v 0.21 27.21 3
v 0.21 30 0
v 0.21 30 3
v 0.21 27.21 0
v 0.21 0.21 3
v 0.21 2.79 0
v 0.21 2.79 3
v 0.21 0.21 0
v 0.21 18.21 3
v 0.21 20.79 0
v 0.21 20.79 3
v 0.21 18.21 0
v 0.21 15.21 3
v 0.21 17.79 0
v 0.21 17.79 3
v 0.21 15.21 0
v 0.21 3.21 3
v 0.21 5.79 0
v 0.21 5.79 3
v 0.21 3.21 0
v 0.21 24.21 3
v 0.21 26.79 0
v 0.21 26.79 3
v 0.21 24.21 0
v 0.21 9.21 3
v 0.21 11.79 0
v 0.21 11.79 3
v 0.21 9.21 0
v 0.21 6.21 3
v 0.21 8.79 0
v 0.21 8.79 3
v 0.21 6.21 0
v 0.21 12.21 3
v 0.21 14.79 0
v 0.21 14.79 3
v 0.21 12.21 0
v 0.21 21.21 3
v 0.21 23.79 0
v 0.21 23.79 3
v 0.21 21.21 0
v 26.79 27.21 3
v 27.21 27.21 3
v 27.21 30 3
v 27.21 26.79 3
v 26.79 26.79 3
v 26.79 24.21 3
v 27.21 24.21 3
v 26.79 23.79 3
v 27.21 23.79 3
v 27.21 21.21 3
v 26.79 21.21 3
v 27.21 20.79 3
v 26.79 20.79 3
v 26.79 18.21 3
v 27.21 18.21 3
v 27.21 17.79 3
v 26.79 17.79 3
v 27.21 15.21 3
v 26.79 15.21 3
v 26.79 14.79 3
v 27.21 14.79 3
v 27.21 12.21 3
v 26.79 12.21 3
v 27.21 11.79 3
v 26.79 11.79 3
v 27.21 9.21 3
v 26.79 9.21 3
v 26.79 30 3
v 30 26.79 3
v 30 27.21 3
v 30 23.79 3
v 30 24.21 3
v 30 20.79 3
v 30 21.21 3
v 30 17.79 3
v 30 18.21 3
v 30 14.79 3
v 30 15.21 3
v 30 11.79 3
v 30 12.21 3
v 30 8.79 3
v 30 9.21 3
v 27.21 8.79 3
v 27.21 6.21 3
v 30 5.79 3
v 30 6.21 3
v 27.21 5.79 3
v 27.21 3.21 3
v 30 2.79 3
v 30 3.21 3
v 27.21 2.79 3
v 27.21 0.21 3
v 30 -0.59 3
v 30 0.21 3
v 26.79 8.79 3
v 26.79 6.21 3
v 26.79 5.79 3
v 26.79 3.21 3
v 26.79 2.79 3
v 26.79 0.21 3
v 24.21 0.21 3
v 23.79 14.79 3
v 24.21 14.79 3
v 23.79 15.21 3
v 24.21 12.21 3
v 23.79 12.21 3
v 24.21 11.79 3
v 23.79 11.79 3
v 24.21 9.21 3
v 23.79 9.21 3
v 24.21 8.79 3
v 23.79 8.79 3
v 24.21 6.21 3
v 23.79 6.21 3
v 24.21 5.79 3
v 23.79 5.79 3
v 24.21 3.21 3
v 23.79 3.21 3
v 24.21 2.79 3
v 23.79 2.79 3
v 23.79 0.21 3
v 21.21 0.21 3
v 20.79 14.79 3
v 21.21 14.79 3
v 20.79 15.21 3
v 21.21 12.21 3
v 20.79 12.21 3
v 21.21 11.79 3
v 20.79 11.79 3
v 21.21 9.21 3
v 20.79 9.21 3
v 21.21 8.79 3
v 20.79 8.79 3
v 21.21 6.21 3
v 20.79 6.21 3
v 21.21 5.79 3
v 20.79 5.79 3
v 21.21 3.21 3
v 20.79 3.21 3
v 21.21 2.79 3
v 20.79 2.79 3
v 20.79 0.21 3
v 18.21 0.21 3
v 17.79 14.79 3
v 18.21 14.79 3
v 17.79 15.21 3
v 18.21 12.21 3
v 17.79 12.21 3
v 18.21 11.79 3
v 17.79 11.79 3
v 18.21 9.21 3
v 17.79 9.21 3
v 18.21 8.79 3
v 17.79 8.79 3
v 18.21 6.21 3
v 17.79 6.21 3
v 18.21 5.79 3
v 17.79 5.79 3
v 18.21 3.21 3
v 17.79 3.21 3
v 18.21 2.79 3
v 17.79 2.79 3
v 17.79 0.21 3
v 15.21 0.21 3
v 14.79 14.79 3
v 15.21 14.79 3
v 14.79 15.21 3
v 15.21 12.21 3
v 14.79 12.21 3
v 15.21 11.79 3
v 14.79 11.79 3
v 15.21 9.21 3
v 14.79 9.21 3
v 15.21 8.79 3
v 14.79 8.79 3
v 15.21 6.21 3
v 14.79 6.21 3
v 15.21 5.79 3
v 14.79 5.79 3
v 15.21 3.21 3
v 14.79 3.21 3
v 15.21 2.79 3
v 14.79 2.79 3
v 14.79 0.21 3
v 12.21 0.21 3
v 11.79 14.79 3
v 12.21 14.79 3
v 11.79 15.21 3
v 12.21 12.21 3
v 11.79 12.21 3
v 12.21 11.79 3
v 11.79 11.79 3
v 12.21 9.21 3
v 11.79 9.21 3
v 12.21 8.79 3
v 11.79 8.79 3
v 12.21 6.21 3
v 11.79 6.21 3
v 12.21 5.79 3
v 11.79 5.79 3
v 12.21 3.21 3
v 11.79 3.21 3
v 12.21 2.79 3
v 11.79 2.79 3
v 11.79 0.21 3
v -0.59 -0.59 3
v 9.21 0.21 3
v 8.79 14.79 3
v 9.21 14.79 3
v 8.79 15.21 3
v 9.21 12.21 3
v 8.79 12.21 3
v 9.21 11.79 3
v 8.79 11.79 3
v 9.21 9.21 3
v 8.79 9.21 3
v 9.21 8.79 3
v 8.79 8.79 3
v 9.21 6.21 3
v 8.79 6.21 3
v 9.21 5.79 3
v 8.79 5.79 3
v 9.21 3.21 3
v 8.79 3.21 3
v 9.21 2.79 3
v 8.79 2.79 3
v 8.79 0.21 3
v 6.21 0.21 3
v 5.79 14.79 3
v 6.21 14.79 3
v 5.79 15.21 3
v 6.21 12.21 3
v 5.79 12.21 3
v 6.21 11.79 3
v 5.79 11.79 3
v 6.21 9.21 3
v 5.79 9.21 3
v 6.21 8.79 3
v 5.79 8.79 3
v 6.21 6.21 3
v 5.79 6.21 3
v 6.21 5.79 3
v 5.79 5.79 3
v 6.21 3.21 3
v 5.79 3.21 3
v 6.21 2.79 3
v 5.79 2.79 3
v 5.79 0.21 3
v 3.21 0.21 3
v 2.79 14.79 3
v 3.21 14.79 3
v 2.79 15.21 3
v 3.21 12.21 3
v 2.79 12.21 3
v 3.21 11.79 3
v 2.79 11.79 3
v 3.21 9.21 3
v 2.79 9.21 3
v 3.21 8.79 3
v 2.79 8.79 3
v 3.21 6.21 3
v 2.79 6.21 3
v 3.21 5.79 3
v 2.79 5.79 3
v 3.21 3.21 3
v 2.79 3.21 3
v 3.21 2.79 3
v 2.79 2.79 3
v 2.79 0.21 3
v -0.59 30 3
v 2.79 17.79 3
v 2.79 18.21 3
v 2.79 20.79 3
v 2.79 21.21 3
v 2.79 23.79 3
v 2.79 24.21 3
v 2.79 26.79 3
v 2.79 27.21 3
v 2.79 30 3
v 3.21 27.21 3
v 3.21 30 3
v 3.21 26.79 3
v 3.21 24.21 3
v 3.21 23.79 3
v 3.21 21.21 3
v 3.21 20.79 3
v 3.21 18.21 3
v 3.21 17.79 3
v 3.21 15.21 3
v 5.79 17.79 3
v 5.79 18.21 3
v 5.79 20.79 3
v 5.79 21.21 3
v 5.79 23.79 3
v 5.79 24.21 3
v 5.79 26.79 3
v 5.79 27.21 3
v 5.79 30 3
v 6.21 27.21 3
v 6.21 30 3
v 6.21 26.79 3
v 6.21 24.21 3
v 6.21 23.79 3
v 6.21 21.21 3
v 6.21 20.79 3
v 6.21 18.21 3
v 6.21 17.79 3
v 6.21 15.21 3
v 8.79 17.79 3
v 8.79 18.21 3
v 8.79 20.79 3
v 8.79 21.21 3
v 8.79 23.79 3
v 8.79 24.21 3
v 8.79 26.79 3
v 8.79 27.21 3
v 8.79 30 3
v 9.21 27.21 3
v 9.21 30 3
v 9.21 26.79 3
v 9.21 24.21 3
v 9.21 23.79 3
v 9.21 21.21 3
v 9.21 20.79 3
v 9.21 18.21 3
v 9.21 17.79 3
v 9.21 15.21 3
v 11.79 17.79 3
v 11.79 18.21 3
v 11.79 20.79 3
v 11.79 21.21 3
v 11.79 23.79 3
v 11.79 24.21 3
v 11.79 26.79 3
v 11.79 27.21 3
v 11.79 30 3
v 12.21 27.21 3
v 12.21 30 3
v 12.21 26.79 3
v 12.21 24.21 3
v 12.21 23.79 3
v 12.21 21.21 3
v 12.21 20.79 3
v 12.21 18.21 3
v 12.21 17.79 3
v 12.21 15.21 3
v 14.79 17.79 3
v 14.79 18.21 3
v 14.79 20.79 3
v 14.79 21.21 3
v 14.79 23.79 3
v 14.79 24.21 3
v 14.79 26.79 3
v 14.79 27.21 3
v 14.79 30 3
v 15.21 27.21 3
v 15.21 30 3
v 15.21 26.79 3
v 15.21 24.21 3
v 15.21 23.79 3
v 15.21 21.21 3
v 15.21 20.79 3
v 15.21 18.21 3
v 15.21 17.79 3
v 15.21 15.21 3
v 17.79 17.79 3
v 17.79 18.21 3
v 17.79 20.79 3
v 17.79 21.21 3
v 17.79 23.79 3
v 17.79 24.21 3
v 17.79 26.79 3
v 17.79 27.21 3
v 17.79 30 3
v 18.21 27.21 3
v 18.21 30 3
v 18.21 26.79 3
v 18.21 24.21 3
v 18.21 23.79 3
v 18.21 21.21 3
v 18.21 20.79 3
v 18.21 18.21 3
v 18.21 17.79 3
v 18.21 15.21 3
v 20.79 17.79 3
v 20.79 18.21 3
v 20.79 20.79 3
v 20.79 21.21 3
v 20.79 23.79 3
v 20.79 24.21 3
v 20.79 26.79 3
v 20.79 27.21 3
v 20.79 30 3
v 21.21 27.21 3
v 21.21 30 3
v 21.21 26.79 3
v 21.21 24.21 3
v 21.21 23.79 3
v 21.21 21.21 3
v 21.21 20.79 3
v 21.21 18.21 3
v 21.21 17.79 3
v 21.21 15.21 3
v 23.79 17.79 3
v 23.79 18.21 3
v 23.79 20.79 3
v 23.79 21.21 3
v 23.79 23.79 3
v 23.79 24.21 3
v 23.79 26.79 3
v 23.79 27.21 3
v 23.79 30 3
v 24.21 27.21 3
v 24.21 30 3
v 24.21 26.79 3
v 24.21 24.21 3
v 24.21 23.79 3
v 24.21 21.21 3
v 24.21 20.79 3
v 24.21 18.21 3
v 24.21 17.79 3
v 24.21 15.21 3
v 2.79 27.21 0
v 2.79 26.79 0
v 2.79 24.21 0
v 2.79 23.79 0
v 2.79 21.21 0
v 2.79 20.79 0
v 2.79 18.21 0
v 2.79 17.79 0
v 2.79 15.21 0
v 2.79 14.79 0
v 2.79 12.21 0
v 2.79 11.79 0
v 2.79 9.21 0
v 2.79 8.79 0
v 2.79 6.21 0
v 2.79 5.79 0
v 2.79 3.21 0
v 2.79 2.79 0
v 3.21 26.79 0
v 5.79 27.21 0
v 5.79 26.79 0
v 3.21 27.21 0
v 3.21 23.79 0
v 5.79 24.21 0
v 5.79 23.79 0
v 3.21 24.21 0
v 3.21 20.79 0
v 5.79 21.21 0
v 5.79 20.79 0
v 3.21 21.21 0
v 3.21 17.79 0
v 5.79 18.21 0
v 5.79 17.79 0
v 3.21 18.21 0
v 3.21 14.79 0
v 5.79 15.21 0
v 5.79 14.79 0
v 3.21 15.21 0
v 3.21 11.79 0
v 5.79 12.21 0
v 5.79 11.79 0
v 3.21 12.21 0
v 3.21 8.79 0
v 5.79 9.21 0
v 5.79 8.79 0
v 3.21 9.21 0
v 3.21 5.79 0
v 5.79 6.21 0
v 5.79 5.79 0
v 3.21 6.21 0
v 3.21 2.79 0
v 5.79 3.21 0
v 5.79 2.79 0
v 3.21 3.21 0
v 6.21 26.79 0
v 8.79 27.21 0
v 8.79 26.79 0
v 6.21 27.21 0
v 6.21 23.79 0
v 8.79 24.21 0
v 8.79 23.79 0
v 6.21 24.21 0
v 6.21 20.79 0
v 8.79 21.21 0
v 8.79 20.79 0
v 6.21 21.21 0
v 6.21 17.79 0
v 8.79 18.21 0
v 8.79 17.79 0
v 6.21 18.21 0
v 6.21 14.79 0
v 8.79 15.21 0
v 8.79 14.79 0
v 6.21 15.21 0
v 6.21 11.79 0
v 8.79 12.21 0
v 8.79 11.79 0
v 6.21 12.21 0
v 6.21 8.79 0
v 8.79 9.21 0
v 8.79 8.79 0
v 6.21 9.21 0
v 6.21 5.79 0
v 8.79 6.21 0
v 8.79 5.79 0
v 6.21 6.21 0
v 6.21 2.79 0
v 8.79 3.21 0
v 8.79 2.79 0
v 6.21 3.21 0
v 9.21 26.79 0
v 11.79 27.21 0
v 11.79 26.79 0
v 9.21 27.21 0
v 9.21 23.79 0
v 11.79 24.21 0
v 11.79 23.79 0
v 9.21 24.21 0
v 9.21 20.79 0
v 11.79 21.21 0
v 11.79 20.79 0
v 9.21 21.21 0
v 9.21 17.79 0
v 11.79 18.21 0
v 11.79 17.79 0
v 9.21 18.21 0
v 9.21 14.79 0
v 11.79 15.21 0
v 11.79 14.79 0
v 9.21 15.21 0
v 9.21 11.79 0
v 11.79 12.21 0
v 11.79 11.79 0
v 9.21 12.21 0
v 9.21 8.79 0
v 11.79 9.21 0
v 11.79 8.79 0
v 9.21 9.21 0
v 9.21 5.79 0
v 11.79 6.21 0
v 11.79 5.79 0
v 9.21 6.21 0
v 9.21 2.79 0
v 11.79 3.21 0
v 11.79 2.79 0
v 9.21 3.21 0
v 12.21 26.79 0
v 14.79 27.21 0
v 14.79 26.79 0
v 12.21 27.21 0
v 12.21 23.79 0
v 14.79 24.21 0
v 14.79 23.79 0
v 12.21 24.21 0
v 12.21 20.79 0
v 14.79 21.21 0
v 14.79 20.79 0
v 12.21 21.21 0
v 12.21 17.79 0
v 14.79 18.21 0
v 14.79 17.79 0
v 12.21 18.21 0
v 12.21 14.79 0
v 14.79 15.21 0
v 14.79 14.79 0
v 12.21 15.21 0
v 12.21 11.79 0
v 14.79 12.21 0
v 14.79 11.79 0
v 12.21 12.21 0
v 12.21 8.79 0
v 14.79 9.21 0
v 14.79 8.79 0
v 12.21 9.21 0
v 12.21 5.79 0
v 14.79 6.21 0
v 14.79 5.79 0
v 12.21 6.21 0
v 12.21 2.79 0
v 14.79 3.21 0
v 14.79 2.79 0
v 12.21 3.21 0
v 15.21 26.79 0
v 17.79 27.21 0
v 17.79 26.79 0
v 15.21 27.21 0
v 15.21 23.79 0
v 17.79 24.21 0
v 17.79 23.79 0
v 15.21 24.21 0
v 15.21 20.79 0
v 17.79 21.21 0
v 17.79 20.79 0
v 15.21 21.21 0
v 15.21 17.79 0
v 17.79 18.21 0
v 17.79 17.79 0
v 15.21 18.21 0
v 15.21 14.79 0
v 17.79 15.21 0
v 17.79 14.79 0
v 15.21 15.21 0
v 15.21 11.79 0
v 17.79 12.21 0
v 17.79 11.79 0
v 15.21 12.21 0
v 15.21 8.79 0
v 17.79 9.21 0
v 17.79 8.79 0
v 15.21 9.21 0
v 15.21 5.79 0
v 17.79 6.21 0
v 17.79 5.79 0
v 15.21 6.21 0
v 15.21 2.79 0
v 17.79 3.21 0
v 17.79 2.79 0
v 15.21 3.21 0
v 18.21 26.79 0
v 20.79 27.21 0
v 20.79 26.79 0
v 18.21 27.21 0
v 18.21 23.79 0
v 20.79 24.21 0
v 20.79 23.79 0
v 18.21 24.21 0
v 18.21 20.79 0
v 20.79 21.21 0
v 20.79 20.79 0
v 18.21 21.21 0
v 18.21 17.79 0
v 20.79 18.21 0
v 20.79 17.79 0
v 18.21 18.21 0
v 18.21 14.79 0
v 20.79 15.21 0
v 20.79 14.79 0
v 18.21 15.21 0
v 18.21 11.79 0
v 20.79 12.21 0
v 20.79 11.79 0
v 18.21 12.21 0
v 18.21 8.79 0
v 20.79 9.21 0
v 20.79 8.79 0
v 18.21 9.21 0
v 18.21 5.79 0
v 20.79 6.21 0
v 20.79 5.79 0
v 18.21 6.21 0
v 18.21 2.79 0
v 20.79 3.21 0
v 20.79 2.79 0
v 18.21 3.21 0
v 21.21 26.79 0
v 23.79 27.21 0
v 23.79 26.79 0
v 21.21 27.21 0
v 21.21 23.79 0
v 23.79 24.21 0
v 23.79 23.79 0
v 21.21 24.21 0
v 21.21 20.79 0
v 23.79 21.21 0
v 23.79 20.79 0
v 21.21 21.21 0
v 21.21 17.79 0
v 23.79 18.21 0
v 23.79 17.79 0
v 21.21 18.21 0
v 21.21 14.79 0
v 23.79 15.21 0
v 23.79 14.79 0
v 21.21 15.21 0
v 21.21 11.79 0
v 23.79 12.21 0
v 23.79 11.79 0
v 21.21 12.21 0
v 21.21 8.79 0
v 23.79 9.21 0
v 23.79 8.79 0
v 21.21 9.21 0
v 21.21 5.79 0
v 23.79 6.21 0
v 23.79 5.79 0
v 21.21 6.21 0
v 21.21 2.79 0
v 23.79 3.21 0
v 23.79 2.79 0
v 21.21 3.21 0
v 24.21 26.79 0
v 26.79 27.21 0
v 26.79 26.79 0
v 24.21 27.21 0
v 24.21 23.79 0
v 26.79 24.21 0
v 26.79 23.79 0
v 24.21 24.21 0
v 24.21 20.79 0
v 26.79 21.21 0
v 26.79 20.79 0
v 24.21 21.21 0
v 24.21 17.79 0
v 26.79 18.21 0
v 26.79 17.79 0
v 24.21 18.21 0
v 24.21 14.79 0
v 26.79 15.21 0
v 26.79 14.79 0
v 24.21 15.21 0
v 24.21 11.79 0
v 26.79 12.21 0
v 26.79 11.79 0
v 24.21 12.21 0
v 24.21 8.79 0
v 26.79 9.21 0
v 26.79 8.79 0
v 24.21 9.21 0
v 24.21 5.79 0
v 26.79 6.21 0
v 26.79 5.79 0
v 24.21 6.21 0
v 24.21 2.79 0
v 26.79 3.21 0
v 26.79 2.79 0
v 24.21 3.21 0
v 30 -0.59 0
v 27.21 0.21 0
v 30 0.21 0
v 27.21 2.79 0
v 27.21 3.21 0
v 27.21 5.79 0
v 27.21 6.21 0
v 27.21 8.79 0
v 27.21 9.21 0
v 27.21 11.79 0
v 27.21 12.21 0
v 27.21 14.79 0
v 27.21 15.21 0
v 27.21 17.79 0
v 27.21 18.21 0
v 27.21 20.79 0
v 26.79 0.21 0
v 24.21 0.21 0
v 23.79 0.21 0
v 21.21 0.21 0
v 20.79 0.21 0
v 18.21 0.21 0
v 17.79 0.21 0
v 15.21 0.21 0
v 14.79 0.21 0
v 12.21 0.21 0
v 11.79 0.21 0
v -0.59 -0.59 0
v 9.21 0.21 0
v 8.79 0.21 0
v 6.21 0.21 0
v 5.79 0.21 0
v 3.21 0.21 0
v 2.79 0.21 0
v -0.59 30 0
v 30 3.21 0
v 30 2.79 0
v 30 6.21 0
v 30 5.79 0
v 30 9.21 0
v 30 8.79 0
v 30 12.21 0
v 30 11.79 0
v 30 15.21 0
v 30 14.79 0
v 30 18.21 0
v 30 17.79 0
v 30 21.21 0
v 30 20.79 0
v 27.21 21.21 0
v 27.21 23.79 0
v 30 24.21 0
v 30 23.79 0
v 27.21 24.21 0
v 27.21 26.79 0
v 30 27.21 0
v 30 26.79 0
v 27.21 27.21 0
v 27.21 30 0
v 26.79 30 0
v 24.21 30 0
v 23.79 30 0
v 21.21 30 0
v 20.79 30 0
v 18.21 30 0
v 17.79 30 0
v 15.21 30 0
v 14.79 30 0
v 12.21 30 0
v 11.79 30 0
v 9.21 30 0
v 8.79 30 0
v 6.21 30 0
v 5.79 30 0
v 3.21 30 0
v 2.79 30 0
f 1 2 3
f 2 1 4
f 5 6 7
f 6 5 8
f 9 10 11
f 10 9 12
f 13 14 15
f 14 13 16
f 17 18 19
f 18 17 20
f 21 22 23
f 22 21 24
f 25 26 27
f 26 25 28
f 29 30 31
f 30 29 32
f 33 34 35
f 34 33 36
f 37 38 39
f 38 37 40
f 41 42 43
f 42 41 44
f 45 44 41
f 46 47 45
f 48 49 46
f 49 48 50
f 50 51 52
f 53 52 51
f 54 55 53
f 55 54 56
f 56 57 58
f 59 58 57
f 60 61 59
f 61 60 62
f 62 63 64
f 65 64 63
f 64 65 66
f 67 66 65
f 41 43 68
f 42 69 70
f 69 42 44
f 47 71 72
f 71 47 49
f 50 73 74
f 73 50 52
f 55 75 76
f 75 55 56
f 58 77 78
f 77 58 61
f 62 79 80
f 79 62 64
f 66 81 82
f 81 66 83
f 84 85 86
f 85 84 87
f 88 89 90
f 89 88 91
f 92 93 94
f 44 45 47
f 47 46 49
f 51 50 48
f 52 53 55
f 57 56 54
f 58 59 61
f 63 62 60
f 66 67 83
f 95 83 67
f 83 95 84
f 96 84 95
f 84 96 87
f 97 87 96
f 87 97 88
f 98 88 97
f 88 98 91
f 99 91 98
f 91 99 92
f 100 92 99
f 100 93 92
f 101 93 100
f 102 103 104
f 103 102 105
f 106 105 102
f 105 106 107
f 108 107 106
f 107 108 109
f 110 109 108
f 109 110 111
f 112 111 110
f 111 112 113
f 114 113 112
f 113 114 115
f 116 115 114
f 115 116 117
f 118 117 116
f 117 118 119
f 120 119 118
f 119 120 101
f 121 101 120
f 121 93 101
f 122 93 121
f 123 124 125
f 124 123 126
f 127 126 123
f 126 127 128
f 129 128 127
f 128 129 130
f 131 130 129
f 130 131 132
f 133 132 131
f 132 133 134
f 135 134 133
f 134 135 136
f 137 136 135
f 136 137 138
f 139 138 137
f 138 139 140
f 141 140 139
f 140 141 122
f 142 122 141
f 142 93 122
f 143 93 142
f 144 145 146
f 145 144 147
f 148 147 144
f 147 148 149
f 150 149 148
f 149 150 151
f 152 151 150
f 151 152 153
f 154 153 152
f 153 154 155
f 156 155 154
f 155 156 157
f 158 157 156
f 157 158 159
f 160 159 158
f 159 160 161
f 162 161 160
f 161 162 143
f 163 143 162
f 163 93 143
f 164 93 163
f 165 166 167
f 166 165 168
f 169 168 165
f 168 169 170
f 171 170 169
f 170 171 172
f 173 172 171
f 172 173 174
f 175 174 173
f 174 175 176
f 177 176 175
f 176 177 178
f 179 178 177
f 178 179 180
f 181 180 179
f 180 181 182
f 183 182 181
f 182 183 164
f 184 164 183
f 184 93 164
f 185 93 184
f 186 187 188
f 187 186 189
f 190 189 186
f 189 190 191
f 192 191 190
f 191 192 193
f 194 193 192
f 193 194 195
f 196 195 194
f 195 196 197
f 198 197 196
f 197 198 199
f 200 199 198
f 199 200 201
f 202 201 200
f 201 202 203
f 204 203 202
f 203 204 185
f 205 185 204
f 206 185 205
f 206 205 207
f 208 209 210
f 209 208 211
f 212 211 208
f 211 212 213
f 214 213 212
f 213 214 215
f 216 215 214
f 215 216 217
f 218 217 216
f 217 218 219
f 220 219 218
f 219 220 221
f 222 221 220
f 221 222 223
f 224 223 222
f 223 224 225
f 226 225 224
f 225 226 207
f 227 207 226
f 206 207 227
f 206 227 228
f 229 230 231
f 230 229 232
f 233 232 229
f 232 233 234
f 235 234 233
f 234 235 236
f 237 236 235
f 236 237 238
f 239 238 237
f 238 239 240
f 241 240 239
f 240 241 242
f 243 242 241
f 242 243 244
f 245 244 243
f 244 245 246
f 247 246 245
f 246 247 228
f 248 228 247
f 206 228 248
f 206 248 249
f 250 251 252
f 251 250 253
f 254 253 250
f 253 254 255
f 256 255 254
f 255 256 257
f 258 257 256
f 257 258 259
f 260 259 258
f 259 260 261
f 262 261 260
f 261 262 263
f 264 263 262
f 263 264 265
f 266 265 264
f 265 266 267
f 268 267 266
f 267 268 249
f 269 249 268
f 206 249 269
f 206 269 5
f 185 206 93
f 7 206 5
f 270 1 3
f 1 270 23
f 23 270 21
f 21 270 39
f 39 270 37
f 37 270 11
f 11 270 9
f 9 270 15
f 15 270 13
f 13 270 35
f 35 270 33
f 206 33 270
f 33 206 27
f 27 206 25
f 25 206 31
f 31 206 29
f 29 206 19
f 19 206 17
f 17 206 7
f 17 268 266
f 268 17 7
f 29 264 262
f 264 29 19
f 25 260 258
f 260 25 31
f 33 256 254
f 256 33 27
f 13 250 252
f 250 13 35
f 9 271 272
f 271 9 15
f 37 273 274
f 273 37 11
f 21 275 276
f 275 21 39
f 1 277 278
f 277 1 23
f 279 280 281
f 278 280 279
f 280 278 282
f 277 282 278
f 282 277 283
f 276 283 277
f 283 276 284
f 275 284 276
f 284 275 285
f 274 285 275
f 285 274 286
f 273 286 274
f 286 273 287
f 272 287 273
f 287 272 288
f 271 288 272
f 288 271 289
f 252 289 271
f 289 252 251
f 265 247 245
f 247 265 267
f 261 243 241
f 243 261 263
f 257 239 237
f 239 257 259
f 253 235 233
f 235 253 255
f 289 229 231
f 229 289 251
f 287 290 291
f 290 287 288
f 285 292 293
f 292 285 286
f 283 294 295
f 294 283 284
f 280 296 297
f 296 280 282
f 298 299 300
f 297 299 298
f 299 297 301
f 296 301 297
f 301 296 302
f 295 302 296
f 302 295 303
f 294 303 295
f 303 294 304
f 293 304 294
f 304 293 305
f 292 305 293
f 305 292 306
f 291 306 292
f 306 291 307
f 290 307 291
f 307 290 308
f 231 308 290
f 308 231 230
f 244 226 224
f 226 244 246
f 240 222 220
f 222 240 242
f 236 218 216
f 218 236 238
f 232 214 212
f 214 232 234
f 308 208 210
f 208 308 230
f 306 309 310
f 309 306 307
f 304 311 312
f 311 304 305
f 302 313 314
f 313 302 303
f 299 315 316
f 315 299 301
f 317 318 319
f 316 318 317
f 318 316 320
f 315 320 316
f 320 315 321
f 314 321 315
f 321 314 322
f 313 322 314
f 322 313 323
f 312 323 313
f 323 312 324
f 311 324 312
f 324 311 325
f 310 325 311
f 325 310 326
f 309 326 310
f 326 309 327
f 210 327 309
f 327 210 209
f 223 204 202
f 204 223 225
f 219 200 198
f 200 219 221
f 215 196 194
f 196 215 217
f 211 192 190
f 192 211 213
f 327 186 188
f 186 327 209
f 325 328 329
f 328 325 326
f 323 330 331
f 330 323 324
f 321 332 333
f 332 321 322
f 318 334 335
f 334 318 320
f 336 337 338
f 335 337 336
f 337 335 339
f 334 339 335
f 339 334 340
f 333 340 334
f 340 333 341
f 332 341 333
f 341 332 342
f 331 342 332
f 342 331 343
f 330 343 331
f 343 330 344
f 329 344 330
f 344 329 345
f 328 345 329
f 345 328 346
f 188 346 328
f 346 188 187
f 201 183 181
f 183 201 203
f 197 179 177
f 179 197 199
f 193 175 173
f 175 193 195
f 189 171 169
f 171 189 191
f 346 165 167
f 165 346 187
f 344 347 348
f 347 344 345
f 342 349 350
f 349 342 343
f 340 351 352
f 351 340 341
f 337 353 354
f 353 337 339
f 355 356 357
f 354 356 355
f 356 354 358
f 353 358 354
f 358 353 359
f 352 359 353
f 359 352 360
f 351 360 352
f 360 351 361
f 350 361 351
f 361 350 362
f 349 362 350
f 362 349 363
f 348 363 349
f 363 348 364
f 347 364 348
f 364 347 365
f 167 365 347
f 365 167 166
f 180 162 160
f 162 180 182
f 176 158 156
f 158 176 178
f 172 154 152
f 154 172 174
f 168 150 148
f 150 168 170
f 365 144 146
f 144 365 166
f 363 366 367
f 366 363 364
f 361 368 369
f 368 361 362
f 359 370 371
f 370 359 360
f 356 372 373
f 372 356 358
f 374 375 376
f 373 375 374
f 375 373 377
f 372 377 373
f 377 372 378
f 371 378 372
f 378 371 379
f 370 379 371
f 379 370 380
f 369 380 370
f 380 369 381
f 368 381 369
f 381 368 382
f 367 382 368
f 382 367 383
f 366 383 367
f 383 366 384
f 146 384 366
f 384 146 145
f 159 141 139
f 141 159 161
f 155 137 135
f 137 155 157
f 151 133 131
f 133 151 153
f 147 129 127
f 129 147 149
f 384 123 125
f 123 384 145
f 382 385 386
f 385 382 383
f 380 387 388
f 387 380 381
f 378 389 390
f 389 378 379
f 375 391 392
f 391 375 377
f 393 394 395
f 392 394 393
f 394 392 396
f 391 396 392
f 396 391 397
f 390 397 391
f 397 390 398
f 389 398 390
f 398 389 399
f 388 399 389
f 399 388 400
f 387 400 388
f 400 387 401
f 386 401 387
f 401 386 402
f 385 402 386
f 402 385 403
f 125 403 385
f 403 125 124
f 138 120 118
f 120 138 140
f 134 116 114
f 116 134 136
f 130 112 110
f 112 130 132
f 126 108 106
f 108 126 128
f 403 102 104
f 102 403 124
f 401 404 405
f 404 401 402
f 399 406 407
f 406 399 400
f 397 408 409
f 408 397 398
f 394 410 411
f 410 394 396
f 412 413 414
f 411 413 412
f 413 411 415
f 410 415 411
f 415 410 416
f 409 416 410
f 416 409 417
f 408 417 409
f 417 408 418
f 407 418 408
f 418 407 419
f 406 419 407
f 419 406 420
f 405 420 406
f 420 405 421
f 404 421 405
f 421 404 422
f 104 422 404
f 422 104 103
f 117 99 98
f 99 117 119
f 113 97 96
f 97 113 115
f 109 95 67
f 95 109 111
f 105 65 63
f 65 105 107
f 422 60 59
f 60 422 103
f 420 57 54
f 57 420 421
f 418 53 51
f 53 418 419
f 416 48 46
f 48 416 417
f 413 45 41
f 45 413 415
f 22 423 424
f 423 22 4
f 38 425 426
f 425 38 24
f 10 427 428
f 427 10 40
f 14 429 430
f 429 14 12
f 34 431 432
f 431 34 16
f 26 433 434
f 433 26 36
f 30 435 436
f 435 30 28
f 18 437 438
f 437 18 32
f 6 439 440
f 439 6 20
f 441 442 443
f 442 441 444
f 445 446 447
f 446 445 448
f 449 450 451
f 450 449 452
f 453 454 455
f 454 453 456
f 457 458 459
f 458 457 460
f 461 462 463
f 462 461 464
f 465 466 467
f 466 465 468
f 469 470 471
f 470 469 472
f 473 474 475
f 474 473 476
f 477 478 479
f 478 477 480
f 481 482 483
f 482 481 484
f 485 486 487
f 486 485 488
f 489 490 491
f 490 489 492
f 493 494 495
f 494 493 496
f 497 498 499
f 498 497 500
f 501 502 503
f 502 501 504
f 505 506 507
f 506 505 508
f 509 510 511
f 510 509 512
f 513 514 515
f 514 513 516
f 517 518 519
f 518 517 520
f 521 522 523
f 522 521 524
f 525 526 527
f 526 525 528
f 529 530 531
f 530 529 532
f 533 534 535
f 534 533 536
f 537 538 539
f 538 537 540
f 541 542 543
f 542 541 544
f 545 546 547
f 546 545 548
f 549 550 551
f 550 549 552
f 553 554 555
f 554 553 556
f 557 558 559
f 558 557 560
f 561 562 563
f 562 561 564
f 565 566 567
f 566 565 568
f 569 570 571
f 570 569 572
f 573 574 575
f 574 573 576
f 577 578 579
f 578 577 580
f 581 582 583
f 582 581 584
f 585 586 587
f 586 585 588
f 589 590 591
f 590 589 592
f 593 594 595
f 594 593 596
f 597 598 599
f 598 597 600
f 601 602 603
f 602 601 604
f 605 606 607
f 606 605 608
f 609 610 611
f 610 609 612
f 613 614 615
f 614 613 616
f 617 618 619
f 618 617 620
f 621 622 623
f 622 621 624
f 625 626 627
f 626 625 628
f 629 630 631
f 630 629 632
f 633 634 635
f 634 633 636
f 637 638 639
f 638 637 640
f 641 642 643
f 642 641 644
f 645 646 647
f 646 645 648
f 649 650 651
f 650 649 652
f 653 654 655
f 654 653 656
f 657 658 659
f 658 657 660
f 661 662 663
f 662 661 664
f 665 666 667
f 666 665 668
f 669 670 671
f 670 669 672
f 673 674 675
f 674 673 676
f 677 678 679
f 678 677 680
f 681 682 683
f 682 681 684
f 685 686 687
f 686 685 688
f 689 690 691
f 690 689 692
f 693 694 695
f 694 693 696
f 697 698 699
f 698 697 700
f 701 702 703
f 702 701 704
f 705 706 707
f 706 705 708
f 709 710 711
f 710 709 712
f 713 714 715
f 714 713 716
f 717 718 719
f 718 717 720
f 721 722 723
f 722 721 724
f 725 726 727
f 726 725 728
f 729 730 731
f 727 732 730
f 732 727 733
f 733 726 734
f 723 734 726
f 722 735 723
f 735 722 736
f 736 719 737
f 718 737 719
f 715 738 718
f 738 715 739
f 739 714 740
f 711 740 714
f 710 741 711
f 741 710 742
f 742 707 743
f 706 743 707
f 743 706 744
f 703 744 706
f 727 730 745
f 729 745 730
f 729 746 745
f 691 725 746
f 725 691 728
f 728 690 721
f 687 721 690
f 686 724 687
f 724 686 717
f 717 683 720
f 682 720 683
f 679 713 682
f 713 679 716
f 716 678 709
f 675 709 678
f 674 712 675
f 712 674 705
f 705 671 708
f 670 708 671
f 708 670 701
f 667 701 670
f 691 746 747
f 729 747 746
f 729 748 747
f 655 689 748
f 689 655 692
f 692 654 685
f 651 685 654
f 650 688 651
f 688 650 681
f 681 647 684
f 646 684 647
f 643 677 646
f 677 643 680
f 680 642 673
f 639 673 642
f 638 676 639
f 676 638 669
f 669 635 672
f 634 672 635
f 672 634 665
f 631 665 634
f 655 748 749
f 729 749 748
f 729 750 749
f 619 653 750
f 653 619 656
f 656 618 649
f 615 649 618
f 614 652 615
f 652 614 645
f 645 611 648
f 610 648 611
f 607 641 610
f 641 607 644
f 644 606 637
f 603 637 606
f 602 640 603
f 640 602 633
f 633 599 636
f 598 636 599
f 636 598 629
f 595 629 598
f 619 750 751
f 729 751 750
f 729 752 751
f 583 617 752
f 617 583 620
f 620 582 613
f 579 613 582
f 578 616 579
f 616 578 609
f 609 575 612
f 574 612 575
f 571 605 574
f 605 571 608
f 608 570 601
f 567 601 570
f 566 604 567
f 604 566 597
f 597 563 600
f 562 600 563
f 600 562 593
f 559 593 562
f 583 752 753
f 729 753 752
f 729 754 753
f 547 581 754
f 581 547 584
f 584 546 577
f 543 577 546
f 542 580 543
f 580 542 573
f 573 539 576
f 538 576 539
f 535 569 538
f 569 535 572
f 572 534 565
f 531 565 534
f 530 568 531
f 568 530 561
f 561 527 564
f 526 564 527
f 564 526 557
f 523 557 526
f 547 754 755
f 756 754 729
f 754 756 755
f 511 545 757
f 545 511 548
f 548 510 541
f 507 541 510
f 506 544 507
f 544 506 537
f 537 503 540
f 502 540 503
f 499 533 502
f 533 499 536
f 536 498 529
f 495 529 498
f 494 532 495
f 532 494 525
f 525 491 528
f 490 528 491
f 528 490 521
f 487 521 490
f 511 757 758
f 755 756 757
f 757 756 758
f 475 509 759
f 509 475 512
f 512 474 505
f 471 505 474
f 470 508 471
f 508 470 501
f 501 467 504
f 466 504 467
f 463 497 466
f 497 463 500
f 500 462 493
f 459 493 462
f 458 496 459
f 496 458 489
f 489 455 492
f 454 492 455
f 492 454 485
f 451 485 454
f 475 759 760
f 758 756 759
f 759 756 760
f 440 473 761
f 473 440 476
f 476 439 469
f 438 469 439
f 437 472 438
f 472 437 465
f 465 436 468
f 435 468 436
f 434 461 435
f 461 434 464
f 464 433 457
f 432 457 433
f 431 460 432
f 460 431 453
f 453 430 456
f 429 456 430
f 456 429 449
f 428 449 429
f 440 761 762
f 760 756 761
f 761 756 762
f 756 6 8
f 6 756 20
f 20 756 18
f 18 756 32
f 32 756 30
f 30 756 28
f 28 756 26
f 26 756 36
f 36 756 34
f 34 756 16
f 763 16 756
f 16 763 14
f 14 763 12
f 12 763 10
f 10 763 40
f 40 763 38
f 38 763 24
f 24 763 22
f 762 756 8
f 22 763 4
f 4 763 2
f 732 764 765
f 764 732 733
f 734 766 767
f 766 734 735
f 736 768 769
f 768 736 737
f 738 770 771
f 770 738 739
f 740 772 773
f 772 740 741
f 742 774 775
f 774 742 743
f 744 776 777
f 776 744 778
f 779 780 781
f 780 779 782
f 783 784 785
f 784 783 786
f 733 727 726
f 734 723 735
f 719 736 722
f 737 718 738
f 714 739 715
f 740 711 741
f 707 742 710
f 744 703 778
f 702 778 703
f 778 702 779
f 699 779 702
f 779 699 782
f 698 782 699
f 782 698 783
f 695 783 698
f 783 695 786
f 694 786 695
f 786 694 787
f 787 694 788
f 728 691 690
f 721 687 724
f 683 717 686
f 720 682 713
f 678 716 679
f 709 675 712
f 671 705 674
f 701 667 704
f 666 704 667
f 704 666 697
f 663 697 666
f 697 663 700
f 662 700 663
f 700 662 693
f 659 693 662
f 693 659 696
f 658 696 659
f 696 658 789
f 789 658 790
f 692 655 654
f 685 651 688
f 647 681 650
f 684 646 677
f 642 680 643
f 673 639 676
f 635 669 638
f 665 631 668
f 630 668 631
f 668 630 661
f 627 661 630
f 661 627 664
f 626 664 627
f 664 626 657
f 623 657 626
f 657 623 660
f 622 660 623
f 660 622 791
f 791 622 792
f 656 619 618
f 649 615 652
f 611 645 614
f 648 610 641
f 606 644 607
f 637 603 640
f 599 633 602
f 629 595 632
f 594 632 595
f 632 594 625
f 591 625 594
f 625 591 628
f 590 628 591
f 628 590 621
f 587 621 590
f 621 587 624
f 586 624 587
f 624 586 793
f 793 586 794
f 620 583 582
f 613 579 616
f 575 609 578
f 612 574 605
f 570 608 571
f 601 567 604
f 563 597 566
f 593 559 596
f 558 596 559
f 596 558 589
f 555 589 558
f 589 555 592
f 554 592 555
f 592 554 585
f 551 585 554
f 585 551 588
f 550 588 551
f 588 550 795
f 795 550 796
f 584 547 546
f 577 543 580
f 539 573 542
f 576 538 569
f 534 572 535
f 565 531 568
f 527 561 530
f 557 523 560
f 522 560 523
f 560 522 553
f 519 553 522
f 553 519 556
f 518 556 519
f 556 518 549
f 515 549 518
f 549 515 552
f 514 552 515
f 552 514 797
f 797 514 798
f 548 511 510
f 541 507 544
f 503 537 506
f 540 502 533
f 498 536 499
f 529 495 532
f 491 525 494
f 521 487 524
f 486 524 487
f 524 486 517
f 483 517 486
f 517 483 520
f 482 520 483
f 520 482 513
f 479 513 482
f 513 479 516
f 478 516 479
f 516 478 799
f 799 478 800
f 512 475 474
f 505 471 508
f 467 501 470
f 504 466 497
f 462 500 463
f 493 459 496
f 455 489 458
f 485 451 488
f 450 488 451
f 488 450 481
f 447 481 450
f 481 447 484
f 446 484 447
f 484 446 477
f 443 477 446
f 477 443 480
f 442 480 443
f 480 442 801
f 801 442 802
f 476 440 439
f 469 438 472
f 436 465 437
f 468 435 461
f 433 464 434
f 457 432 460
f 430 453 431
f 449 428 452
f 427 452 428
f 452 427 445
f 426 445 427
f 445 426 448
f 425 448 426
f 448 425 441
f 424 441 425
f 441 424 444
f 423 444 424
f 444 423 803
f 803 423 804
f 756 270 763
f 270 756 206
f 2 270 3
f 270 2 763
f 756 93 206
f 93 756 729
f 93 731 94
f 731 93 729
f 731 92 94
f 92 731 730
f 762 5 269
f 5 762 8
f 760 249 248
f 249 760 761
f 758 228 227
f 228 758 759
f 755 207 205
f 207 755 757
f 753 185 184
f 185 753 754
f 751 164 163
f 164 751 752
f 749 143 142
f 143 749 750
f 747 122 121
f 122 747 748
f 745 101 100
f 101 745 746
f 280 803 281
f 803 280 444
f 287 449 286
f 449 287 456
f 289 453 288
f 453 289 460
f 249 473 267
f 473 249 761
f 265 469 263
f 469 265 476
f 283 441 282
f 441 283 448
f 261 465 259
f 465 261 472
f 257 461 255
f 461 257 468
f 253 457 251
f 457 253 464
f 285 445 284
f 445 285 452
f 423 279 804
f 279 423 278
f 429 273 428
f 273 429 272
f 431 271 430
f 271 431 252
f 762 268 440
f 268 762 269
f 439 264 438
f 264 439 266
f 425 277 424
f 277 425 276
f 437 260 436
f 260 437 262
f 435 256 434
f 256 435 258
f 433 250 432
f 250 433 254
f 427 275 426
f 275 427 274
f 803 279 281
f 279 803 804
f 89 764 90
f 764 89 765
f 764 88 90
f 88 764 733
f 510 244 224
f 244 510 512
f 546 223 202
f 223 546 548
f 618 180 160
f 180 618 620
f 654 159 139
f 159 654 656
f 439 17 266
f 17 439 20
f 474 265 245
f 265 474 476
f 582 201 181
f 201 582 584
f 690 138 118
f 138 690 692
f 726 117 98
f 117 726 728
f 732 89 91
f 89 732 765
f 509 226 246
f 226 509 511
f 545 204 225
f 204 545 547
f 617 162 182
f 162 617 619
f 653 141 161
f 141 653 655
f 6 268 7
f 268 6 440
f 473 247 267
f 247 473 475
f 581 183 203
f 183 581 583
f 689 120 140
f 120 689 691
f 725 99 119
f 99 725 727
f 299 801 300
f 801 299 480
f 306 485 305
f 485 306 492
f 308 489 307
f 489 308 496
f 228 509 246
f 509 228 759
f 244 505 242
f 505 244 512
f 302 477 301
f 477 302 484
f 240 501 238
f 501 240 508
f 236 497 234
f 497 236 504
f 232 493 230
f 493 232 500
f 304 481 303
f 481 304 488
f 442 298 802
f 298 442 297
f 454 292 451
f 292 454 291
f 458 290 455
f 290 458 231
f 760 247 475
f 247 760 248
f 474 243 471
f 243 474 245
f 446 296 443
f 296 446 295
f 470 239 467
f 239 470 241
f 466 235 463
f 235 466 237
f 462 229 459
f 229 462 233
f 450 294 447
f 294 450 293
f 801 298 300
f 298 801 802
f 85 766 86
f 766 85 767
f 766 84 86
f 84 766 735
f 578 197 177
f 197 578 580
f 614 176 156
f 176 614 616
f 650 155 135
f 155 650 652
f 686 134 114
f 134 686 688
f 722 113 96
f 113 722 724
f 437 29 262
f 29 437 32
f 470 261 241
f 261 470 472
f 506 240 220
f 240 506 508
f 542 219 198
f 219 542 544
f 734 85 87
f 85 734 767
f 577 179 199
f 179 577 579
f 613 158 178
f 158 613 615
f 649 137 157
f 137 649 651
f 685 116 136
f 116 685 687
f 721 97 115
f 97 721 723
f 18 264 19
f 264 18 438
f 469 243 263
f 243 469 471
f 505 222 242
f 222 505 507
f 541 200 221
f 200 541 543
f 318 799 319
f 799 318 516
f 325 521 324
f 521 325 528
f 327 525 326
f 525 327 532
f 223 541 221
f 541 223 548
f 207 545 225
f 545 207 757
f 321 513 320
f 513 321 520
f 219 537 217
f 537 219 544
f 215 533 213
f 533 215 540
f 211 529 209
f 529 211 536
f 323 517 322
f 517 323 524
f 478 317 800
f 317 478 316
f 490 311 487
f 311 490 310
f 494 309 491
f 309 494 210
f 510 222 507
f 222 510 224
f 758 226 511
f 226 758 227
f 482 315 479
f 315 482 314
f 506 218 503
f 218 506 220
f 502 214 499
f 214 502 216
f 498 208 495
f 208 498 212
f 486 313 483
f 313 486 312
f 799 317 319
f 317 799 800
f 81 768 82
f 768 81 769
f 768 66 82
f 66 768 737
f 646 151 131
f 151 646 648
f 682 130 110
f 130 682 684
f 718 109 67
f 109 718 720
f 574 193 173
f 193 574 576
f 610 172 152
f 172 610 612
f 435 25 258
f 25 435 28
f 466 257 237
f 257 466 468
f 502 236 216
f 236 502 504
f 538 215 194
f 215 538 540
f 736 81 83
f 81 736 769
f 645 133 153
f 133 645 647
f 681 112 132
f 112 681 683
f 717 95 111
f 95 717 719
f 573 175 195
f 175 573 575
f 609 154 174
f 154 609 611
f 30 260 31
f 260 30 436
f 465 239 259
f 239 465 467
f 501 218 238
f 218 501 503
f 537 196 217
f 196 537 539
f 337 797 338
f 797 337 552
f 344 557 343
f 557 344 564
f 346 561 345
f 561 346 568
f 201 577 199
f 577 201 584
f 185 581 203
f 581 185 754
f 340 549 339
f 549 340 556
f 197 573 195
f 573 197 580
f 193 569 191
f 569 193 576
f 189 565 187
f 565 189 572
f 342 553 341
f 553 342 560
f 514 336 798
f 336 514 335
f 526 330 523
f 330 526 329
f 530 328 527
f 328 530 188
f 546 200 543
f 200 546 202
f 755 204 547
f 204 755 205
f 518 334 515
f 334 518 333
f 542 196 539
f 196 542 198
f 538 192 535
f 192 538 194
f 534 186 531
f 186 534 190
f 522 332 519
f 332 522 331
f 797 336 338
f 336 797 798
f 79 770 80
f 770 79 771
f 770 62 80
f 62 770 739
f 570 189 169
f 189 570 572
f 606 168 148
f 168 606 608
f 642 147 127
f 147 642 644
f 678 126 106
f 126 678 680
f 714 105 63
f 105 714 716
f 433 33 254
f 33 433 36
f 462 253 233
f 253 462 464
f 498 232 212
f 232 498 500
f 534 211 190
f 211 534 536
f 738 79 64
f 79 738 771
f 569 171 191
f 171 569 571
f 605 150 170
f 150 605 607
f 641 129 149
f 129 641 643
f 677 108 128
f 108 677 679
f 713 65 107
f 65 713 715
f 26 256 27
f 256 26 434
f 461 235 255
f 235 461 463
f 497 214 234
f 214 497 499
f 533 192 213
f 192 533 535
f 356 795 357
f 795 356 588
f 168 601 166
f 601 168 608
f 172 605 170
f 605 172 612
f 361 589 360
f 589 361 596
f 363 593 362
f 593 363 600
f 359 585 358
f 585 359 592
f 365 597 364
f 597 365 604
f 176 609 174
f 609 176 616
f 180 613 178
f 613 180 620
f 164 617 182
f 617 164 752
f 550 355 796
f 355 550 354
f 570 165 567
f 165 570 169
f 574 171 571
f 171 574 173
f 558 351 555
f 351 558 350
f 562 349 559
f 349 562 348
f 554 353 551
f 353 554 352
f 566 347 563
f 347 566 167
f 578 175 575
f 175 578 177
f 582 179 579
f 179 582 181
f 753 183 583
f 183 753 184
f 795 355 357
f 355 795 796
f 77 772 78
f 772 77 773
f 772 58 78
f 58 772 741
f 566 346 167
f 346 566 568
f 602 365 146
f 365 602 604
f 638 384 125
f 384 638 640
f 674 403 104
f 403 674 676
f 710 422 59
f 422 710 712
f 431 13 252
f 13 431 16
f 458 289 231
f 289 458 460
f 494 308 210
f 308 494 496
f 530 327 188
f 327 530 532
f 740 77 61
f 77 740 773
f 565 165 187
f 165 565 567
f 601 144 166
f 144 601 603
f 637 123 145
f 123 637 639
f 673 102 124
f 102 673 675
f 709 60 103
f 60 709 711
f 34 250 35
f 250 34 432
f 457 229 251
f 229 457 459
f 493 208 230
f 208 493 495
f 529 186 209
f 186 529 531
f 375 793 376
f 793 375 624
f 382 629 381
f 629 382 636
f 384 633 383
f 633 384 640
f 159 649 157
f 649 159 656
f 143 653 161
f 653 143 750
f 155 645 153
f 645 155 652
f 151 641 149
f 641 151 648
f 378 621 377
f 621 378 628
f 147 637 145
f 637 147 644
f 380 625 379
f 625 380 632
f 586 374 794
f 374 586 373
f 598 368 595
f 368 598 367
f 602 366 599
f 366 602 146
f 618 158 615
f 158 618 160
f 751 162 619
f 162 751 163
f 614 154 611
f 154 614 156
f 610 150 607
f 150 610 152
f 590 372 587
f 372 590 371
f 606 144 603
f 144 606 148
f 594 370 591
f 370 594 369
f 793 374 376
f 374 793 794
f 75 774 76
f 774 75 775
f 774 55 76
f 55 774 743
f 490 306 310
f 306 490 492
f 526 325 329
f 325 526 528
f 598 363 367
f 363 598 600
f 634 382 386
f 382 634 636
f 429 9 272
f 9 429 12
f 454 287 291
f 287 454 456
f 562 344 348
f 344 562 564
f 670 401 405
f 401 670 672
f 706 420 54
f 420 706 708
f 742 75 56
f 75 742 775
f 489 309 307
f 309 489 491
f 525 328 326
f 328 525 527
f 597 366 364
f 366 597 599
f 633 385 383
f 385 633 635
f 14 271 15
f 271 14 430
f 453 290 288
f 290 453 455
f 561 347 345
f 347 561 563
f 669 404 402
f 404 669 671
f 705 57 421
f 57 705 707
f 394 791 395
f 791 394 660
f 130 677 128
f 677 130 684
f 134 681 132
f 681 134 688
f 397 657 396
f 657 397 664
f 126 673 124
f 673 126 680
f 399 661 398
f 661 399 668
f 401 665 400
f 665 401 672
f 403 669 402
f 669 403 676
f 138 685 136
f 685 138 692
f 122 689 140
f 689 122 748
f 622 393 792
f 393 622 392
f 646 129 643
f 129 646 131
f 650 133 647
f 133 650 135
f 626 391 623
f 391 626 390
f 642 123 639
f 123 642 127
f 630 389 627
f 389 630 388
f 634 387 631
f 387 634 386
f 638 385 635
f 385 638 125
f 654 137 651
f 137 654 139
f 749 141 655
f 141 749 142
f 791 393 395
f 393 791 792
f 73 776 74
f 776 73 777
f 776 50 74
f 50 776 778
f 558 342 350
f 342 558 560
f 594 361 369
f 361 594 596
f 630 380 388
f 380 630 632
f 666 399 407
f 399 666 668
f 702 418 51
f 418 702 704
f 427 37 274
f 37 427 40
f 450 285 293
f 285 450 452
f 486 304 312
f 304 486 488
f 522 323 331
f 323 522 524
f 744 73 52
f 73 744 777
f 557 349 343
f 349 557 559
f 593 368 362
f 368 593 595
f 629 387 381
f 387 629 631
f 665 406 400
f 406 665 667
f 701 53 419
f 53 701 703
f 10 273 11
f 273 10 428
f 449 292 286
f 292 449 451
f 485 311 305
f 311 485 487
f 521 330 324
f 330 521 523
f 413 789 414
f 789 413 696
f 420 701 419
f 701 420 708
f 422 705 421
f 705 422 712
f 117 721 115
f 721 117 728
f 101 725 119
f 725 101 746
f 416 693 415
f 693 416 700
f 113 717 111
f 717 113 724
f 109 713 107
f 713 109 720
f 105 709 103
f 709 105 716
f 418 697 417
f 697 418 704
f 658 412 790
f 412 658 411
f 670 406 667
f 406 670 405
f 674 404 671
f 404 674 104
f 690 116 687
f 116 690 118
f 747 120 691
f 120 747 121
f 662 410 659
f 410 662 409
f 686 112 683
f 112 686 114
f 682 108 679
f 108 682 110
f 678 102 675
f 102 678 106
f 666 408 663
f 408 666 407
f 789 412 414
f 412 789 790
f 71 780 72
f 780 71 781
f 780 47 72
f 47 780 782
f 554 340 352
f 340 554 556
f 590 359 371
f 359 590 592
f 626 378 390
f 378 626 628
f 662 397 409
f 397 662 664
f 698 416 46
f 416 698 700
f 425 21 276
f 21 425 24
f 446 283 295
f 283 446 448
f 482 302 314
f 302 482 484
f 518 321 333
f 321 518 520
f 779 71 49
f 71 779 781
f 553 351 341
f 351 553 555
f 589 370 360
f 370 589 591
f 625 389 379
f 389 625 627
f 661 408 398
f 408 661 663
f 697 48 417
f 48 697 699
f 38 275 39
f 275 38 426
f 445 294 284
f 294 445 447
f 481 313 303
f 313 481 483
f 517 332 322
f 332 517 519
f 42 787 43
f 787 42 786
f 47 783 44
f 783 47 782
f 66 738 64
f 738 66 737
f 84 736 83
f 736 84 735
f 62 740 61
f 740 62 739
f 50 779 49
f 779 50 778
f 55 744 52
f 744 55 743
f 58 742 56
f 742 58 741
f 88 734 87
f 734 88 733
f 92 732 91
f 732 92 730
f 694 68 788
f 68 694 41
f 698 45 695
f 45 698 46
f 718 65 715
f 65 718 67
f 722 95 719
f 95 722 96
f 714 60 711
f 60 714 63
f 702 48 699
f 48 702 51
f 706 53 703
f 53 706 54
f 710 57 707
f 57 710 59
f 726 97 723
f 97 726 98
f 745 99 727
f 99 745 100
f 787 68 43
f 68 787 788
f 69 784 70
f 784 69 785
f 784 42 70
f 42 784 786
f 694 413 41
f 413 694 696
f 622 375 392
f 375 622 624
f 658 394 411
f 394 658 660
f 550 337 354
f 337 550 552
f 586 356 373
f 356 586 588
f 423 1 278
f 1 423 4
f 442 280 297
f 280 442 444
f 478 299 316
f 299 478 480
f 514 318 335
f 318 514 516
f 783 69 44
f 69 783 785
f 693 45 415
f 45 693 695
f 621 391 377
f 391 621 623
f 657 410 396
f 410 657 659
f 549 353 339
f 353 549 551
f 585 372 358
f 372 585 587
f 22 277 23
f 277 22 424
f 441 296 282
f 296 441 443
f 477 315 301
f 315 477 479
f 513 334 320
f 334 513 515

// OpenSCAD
// baffle-mini.scad — 10x10 test swatch of baffle.scad
//
// Same geometry as baffle.scad (identical pitch / wall / height / border), just
// clipped to a 10x10 corner so you can verify pitch + fit with a short print and
// almost no filament before committing to the full 64x64.
//
// Outer reference walls only on the LEFT (x=0) and BOTTOM (y=0) edges; the top
// and right are left open. Like the full part, the outer walls extend OUTWARD
// past the edge, so every pixel cell — including the edge ones — is the same
// size. Print FLAT, no supports. Black matte PLA.

/* ---------------- parameters ---------------- */
pitch  = 3;     // LED pixel pitch (mm)  -> cell size
n      = 10;    // cells per side in this test swatch
wall   = 0.42;  // internal wall thickness (mm) == the single printed line width.
                // Under Arachne (Bambu Studio default) each wall is one perimeter
                // whose width is set to fill this value, so this number *is* the
                // printed line. 0.40 (= nozzle) is the floor; 0.42 keeps one clean
                // line with a hair of margin. Set the slicer's wall line width to
                // match, and CALIBRATE FLOW or it prints fat regardless.
height = 3;     // wall height in Z (mm). Tuned against the real panel + diffuser:
                // 5mm over-isolated and blocked too much off-axis light; ~2.5-3mm
                // gives clean per-pixel cells. Lower height also prints easier
                // (7:1 aspect at 0.42 wall vs 12:1 at 5mm).
border = 0.8;   // thickness of the bottom/left reference walls (mm)

span = n * pitch;            // 30 mm
ext  = border - wall / 2;    // outer-wall overhang past the edge
echo(span = span, cells = n * n);

/* ---------------- geometry ------------------ */

// interior walls at x,y = 3, 6, ... (n-1)*pitch
module internal_walls() {
    for (k = [1 : n - 1]) {
        // walls running along Y (constant x)
        translate([k * pitch - wall / 2, 0, 0])
            cube([wall, span, height]);
        // walls running along X (constant y)
        translate([0, k * pitch - wall / 2, 0])
            cube([span, wall, height]);
    }
}

// outer reference walls on the LEFT (x=0) and BOTTOM (y=0) edges only.
// Their inner faces sit flush with the edge pixels' openings; the body extends
// outward (past x=0 / y=0) so the edge pixels stay full size.
module corner_walls() {
    translate([-ext, -ext, 0]) cube([border, span + ext, height]); // left
    translate([-ext, -ext, 0]) cube([span + ext, border, height]); // bottom
}

union() {
    corner_walls();
    internal_walls();
}
